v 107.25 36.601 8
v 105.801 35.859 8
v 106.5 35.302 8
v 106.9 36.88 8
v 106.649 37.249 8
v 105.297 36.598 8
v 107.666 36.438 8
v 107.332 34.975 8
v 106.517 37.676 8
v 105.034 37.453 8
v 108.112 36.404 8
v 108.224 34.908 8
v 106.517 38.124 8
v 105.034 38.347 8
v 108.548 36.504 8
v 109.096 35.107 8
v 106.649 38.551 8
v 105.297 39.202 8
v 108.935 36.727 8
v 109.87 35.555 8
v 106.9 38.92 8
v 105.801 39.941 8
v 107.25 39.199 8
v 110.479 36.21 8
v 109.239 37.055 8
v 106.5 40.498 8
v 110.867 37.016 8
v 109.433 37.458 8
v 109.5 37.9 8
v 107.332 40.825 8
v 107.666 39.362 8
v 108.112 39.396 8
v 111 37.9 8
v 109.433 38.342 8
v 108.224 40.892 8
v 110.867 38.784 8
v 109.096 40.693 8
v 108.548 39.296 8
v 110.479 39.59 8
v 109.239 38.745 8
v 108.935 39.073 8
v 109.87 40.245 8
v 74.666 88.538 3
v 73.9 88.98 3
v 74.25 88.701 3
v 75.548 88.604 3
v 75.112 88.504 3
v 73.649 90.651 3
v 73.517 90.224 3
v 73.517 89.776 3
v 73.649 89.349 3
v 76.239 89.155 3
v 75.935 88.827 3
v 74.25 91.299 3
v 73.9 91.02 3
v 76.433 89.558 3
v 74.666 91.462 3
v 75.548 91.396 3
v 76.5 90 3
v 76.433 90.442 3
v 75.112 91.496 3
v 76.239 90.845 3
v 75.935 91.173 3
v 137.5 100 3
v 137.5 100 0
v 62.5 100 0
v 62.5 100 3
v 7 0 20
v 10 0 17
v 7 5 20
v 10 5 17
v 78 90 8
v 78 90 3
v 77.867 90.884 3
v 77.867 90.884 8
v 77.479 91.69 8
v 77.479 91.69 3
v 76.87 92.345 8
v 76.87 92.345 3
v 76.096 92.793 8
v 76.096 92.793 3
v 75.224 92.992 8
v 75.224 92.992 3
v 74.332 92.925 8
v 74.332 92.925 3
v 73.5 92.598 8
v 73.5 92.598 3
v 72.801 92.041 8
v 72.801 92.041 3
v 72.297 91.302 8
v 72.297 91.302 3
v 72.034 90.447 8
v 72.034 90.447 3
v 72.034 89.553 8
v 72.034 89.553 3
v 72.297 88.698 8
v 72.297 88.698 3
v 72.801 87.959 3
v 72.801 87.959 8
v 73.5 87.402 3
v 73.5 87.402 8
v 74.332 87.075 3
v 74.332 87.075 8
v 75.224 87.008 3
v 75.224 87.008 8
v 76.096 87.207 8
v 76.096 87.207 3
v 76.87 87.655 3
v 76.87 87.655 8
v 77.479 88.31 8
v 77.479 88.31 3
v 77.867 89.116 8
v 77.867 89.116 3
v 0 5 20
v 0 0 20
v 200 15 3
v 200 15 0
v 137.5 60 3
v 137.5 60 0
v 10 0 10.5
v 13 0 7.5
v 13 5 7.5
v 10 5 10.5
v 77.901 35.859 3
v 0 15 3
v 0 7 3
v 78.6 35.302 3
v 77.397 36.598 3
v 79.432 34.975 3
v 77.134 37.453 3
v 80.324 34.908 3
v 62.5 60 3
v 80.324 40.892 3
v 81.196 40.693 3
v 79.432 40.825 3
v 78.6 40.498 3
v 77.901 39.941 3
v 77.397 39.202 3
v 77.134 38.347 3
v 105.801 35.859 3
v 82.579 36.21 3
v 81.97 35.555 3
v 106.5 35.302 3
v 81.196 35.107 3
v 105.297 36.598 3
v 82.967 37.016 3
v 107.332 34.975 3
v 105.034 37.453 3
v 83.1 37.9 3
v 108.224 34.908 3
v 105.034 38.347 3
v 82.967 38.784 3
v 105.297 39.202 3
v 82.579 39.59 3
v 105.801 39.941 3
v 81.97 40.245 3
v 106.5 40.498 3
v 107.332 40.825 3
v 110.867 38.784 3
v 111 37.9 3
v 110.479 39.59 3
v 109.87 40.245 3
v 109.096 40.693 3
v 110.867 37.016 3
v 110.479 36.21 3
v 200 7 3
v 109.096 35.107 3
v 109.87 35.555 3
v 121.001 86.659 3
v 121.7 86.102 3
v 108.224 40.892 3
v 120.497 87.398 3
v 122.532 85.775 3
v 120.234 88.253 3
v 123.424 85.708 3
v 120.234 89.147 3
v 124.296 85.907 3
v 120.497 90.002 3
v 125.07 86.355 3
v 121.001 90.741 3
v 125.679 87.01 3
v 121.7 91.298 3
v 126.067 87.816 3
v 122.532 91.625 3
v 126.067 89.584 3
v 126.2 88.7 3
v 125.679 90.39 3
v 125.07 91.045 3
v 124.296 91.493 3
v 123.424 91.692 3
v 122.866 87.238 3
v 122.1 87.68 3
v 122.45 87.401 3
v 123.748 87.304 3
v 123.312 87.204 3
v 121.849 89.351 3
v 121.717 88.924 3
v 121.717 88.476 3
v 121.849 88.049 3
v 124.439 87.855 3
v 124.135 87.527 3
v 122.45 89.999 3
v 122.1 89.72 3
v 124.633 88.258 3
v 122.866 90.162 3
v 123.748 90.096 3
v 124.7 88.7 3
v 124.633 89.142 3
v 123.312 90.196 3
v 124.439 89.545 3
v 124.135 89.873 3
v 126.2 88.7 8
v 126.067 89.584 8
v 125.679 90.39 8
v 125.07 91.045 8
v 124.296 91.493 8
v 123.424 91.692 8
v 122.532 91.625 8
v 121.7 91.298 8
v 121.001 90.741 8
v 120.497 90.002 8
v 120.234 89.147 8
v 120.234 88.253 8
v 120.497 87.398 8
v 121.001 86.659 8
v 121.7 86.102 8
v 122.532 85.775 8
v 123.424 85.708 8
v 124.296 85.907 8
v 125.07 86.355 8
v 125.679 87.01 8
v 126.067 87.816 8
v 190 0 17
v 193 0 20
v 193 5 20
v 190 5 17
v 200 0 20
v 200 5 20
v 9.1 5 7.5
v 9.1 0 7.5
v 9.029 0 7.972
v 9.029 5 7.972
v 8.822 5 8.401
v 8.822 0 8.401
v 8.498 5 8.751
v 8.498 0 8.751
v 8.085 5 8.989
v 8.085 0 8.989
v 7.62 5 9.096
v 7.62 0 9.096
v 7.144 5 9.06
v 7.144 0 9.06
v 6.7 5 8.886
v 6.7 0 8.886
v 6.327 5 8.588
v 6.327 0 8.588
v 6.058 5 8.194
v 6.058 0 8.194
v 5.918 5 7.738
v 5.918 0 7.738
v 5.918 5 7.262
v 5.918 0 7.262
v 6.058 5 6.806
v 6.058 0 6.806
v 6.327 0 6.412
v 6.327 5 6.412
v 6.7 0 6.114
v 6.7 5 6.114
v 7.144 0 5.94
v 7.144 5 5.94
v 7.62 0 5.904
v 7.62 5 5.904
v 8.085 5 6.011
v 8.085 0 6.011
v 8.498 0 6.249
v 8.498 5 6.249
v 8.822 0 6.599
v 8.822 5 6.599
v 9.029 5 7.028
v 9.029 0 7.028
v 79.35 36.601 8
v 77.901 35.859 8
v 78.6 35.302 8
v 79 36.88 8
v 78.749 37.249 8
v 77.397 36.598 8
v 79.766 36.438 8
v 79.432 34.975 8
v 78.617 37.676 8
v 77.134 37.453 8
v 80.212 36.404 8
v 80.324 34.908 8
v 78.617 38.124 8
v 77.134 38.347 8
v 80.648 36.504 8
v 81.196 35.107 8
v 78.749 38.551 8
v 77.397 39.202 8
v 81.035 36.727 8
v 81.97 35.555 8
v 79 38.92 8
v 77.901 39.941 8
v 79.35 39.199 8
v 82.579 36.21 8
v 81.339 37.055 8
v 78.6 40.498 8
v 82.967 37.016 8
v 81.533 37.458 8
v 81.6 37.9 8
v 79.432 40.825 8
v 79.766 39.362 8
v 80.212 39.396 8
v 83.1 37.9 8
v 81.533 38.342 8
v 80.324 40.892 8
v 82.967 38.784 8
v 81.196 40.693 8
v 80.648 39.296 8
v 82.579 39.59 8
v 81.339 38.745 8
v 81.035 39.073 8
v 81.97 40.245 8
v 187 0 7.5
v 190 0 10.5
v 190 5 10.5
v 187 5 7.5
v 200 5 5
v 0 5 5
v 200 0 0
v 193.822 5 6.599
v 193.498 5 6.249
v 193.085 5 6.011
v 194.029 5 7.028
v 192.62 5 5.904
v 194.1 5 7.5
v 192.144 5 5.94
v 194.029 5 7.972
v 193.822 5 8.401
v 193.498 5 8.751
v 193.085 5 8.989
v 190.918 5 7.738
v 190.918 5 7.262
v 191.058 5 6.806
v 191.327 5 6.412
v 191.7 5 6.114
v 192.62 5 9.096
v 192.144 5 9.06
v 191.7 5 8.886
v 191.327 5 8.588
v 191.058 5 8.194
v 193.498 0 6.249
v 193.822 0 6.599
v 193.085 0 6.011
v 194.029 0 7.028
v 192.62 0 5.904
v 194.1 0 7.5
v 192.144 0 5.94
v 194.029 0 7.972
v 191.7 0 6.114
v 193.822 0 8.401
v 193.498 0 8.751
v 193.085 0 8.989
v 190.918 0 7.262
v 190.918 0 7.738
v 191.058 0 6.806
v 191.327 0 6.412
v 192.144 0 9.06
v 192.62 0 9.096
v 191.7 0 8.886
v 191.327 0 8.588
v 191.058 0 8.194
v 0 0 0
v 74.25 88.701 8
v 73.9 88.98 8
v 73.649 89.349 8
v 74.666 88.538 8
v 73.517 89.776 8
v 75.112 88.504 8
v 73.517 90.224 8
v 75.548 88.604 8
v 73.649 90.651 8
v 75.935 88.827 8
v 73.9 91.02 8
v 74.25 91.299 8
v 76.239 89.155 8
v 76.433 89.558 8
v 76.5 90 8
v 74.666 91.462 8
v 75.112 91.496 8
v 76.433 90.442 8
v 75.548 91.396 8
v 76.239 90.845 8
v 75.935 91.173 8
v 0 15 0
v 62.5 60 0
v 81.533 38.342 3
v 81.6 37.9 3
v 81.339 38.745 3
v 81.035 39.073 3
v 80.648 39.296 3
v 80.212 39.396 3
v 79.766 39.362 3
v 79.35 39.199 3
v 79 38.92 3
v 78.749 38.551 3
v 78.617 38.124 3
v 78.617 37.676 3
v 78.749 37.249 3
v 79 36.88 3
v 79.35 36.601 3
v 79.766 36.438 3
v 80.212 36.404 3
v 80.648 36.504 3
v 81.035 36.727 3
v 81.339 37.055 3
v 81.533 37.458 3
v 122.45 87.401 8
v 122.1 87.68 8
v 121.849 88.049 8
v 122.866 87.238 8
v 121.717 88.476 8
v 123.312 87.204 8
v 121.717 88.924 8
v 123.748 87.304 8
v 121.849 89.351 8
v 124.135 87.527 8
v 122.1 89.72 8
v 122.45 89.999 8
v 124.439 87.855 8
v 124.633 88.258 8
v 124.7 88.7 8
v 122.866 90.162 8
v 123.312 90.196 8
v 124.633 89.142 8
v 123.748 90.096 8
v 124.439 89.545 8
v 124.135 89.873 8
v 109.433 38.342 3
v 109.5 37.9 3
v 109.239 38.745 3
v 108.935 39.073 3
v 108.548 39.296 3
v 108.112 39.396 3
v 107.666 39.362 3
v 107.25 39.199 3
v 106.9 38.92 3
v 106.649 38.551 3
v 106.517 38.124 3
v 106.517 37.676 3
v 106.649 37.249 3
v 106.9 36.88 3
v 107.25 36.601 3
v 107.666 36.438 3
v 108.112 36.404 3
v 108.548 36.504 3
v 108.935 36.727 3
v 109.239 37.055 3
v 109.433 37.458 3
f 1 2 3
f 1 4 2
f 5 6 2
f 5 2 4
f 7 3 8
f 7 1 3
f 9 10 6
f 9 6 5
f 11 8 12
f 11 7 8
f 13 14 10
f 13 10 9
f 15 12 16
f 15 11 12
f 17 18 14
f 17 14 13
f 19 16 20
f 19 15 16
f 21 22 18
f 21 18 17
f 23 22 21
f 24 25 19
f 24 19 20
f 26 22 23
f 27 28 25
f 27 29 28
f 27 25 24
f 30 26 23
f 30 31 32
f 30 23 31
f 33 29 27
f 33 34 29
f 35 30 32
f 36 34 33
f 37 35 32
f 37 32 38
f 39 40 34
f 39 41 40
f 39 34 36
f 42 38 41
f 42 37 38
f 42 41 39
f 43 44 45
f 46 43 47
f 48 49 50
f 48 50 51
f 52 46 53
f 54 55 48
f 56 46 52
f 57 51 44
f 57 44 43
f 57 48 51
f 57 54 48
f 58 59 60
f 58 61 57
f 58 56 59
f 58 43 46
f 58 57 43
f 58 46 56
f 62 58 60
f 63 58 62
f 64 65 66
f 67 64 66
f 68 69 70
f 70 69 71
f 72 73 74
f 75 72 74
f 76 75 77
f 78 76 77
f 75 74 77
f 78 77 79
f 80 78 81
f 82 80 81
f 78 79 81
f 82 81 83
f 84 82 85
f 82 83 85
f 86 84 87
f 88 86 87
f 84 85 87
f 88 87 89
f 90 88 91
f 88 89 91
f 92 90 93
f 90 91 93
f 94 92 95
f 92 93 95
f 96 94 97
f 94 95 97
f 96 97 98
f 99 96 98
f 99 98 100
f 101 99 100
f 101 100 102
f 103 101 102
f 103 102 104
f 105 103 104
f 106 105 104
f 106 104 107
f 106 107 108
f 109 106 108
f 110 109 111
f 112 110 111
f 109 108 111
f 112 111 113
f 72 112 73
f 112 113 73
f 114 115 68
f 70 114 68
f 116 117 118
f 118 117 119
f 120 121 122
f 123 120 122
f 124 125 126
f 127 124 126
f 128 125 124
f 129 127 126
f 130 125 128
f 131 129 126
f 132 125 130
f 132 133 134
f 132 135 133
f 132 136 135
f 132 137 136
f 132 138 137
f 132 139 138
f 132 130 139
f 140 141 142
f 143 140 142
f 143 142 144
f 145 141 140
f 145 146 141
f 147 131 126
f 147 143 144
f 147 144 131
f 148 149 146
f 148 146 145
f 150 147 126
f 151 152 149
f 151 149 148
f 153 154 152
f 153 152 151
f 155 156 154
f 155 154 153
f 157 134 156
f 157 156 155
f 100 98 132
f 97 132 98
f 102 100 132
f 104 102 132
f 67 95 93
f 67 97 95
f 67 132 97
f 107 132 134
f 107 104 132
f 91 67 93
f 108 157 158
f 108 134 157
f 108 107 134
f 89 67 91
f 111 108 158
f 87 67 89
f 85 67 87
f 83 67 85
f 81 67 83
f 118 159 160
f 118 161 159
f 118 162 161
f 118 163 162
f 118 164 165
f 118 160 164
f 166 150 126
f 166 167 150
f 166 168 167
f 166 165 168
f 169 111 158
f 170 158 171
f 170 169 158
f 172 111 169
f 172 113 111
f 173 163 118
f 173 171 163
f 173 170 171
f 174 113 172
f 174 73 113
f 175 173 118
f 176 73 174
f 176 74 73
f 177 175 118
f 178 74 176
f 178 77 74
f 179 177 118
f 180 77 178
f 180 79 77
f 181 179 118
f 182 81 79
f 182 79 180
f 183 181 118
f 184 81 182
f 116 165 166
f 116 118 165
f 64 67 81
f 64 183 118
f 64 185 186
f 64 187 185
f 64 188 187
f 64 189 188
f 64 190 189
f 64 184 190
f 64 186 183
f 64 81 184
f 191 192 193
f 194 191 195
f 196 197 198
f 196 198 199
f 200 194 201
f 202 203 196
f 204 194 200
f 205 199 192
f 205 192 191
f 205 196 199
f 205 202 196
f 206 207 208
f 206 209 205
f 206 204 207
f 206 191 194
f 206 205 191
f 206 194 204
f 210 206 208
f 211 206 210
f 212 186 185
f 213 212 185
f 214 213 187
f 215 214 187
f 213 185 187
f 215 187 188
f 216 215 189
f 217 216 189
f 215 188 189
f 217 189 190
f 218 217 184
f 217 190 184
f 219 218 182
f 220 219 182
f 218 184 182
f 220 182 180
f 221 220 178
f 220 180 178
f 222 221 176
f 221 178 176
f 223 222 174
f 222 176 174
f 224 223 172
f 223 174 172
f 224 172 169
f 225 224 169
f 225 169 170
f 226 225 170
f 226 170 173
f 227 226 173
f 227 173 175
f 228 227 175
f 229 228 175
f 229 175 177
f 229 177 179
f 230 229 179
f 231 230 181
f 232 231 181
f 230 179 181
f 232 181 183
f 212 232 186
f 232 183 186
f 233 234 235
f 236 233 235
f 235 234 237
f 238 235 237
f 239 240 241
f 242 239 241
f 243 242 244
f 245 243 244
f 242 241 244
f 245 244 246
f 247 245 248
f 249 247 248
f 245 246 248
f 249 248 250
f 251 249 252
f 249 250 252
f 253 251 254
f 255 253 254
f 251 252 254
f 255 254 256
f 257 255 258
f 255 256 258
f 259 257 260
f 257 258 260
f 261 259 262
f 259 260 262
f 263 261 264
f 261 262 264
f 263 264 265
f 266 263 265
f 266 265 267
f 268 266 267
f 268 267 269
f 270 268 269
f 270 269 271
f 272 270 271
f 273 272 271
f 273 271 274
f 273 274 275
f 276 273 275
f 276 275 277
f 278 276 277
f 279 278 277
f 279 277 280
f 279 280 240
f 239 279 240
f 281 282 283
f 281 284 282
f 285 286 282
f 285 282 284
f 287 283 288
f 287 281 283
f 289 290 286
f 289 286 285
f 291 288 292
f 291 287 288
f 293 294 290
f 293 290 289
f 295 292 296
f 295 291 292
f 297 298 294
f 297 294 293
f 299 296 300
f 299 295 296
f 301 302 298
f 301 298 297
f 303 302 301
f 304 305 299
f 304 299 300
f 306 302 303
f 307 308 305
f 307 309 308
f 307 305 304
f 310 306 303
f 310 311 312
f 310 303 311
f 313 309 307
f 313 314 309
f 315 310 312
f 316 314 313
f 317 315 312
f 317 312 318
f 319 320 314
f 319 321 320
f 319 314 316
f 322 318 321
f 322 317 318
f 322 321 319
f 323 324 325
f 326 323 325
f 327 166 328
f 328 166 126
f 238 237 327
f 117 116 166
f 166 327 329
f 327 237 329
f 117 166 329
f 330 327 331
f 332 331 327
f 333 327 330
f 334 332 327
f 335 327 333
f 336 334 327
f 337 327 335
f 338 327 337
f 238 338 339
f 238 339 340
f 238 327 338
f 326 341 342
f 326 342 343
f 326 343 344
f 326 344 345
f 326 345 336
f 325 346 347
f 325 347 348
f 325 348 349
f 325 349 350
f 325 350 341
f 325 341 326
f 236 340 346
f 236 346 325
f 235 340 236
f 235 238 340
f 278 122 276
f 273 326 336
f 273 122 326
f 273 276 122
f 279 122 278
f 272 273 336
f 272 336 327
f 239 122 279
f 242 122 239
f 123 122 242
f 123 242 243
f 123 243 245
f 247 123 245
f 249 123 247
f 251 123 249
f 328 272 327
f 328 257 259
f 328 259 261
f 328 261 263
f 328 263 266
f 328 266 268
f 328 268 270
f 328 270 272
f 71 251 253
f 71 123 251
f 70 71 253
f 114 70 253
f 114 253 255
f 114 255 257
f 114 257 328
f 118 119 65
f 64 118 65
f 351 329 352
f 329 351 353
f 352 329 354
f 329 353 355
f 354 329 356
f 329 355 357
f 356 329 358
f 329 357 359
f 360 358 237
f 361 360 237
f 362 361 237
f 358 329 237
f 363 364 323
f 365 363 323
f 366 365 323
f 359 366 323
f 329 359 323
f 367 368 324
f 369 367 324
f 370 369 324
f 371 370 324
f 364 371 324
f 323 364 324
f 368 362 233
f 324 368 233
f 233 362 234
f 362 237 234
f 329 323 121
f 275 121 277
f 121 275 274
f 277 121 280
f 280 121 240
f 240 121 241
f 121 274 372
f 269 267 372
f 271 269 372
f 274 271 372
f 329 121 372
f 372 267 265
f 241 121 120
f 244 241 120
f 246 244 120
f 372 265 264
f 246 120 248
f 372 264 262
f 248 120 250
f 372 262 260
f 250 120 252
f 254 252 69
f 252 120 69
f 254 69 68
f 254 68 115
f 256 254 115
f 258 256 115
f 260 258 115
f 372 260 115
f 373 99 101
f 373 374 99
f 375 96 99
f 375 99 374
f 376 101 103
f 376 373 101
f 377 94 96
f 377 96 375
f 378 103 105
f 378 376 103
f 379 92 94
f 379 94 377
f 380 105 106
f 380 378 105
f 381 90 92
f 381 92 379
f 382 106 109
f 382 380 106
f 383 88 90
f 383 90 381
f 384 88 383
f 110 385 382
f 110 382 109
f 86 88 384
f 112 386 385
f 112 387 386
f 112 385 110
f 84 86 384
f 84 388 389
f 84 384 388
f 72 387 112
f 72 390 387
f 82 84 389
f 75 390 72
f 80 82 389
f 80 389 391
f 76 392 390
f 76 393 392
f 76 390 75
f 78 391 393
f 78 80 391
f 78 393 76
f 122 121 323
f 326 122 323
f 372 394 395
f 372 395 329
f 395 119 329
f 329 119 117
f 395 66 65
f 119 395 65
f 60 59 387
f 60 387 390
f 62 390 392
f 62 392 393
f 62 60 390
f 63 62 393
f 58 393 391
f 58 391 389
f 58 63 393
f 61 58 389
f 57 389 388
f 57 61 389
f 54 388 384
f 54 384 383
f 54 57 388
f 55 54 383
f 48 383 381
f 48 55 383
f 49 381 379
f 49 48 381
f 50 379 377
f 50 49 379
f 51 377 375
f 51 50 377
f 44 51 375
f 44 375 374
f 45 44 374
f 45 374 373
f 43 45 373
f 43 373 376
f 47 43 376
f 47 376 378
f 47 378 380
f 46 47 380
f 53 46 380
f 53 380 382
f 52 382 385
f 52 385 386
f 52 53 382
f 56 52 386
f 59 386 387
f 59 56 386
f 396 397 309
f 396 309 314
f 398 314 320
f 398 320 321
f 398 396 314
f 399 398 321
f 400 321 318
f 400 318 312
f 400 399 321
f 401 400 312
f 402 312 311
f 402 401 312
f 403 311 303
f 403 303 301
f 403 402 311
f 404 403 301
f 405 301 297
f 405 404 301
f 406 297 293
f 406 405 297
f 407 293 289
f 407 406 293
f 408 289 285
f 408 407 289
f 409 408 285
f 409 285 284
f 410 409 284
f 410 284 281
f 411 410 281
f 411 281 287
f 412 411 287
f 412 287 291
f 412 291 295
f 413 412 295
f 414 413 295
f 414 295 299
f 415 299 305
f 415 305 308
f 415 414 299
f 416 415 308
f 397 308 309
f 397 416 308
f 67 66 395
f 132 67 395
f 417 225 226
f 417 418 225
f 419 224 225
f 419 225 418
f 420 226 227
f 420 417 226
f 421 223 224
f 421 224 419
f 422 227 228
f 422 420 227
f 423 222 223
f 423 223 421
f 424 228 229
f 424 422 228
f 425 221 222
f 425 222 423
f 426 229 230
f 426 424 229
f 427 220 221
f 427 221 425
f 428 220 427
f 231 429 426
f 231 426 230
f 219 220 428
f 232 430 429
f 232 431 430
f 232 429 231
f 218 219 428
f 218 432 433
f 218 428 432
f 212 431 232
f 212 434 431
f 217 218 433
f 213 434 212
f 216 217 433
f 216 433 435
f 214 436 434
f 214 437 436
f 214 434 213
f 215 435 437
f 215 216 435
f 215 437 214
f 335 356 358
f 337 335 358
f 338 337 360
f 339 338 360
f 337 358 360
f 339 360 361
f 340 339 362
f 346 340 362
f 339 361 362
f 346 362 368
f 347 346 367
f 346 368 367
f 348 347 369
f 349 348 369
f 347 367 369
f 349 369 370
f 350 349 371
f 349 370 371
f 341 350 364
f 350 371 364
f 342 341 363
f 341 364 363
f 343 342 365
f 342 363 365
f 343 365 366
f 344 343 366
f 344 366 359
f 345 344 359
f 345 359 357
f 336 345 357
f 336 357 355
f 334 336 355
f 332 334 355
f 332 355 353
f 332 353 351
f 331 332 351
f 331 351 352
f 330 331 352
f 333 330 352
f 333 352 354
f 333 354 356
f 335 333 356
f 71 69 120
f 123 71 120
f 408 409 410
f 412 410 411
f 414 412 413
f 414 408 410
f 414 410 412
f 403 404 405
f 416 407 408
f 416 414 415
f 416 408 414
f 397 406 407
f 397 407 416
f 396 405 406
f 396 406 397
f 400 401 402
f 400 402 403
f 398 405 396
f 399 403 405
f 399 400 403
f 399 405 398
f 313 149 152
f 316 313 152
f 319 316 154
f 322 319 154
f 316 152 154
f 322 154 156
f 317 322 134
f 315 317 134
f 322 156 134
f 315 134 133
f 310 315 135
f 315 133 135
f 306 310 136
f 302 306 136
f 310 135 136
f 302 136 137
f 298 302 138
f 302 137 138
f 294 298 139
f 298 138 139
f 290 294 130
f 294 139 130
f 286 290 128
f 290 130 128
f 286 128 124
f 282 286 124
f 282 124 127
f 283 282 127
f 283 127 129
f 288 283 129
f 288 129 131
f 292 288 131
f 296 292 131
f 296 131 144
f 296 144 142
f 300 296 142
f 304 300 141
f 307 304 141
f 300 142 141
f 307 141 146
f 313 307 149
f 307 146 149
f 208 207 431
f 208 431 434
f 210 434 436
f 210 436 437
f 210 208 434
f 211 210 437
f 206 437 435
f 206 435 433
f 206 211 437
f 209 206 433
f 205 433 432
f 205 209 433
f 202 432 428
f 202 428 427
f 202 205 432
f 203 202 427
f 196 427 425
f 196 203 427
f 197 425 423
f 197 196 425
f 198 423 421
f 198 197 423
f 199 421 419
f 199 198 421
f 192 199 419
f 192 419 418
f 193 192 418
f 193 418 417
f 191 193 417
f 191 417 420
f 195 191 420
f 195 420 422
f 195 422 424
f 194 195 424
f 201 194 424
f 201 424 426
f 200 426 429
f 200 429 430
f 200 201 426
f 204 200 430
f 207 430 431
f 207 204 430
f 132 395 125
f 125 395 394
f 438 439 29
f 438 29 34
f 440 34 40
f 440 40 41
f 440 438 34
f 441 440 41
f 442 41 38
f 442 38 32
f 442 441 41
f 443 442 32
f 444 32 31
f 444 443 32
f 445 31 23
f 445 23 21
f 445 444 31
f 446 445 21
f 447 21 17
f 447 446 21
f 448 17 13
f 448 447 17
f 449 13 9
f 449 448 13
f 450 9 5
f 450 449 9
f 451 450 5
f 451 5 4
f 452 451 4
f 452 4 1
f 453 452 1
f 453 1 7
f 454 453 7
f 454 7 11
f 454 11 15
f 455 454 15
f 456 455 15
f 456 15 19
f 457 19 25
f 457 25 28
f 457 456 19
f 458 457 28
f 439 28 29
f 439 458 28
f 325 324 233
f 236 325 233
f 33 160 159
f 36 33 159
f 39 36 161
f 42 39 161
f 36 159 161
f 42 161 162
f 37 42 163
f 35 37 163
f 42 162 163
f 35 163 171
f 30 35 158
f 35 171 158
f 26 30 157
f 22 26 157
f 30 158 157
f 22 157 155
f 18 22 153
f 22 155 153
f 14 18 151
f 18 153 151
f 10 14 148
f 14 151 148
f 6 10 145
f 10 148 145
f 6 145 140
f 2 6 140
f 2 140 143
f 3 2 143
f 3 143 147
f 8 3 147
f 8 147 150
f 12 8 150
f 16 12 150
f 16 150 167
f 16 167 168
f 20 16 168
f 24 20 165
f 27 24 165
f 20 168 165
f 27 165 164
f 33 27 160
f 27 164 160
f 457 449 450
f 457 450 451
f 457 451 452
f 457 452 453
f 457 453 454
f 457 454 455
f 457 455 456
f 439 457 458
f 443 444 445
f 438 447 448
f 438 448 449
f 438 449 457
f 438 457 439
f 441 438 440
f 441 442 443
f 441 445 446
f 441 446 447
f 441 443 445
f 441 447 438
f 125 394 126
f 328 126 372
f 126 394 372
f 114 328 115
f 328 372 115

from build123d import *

# Parameters (mm, degrees)
PAD_DEPTH       = 3
PAD001_DEPTH    = 5
SKETCH002_R     = 1.6
POCKET_DEPTH    = 100.001
SKETCH003_R     = 3
SKETCH003_R_2   = 1.5
PAD002_DEPTH    = 5
CHAMFER_SIZE    = 3
CHAMFER001_SIZE = 2


with BuildPart() as part:
    # Sketch → Pad (new body)
    with BuildSketch(Plane.XY):
        Polygon((0, 0), (200, 0), (200, 15), (137.5, 60), (137.5, 100), (62.5, 100), (62.5, 60), (0, 15), align=None)
    extrude(amount=PAD_DEPTH)

    # Sketch001 (on Face1 of Pad) → Pad001 (join)
    with BuildSketch(Plane.XZ):
        Polygon((0, 3), (0, 20), (10, 20), (10, 7.5), (190, 7.5), (190, 20), (200, 20), (200, 3), align=None)
    extrude(amount=-PAD001_DEPTH)

    # Sketch002 (on Face14 of Pad001) → Pocket (cut, through all)
    with BuildSketch(Plane.XZ):
        with Locations((7.5, 7.5)):
            Circle(SKETCH002_R)
        with Locations((192.5, 7.5)):
            Circle(SKETCH002_R)
    extrude(amount=-POCKET_DEPTH, mode=Mode.SUBTRACT)

    # Sketch003 (on Face7 of Pocket) → Pad002 (join)
    with BuildSketch(Plane.XY.offset(3)):
        with Locations((75, 90)):
            Circle(SKETCH003_R)
        with Locations((75, 90)):
            Circle(SKETCH003_R_2, mode=Mode.SUBTRACT)
        with Locations((123.2, 88.7)):
            Circle(SKETCH003_R)
        with Locations((123.2, 88.7)):
            Circle(SKETCH003_R_2, mode=Mode.SUBTRACT)
        with Locations((108, 37.9)):
            Circle(SKETCH003_R)
        with Locations((108, 37.9)):
            Circle(SKETCH003_R_2, mode=Mode.SUBTRACT)
        with Locations((80.1, 37.9)):
            Circle(SKETCH003_R)
        with Locations((80.1, 37.9)):
            Circle(SKETCH003_R_2, mode=Mode.SUBTRACT)
    extrude(amount=PAD002_DEPTH)

    # Chamfer
    chamfer_edges = [part.edges().sort_by_distance(p)[0] for p in [
        (10, 2.5, 7.5),
        (190, 2.5, 7.5),
        (190, 2.5, 20),
        (10, 2.5, 20),
    ]]
    chamfer(chamfer_edges, length=CHAMFER_SIZE)

    # Chamfer001
    chamfer001_edges = [part.edges().sort_by_distance(p)[0] for p in [
        (100, 5, 3),
    ]]
    chamfer(chamfer001_edges, length=CHAMFER001_SIZE)


solid = part.part
